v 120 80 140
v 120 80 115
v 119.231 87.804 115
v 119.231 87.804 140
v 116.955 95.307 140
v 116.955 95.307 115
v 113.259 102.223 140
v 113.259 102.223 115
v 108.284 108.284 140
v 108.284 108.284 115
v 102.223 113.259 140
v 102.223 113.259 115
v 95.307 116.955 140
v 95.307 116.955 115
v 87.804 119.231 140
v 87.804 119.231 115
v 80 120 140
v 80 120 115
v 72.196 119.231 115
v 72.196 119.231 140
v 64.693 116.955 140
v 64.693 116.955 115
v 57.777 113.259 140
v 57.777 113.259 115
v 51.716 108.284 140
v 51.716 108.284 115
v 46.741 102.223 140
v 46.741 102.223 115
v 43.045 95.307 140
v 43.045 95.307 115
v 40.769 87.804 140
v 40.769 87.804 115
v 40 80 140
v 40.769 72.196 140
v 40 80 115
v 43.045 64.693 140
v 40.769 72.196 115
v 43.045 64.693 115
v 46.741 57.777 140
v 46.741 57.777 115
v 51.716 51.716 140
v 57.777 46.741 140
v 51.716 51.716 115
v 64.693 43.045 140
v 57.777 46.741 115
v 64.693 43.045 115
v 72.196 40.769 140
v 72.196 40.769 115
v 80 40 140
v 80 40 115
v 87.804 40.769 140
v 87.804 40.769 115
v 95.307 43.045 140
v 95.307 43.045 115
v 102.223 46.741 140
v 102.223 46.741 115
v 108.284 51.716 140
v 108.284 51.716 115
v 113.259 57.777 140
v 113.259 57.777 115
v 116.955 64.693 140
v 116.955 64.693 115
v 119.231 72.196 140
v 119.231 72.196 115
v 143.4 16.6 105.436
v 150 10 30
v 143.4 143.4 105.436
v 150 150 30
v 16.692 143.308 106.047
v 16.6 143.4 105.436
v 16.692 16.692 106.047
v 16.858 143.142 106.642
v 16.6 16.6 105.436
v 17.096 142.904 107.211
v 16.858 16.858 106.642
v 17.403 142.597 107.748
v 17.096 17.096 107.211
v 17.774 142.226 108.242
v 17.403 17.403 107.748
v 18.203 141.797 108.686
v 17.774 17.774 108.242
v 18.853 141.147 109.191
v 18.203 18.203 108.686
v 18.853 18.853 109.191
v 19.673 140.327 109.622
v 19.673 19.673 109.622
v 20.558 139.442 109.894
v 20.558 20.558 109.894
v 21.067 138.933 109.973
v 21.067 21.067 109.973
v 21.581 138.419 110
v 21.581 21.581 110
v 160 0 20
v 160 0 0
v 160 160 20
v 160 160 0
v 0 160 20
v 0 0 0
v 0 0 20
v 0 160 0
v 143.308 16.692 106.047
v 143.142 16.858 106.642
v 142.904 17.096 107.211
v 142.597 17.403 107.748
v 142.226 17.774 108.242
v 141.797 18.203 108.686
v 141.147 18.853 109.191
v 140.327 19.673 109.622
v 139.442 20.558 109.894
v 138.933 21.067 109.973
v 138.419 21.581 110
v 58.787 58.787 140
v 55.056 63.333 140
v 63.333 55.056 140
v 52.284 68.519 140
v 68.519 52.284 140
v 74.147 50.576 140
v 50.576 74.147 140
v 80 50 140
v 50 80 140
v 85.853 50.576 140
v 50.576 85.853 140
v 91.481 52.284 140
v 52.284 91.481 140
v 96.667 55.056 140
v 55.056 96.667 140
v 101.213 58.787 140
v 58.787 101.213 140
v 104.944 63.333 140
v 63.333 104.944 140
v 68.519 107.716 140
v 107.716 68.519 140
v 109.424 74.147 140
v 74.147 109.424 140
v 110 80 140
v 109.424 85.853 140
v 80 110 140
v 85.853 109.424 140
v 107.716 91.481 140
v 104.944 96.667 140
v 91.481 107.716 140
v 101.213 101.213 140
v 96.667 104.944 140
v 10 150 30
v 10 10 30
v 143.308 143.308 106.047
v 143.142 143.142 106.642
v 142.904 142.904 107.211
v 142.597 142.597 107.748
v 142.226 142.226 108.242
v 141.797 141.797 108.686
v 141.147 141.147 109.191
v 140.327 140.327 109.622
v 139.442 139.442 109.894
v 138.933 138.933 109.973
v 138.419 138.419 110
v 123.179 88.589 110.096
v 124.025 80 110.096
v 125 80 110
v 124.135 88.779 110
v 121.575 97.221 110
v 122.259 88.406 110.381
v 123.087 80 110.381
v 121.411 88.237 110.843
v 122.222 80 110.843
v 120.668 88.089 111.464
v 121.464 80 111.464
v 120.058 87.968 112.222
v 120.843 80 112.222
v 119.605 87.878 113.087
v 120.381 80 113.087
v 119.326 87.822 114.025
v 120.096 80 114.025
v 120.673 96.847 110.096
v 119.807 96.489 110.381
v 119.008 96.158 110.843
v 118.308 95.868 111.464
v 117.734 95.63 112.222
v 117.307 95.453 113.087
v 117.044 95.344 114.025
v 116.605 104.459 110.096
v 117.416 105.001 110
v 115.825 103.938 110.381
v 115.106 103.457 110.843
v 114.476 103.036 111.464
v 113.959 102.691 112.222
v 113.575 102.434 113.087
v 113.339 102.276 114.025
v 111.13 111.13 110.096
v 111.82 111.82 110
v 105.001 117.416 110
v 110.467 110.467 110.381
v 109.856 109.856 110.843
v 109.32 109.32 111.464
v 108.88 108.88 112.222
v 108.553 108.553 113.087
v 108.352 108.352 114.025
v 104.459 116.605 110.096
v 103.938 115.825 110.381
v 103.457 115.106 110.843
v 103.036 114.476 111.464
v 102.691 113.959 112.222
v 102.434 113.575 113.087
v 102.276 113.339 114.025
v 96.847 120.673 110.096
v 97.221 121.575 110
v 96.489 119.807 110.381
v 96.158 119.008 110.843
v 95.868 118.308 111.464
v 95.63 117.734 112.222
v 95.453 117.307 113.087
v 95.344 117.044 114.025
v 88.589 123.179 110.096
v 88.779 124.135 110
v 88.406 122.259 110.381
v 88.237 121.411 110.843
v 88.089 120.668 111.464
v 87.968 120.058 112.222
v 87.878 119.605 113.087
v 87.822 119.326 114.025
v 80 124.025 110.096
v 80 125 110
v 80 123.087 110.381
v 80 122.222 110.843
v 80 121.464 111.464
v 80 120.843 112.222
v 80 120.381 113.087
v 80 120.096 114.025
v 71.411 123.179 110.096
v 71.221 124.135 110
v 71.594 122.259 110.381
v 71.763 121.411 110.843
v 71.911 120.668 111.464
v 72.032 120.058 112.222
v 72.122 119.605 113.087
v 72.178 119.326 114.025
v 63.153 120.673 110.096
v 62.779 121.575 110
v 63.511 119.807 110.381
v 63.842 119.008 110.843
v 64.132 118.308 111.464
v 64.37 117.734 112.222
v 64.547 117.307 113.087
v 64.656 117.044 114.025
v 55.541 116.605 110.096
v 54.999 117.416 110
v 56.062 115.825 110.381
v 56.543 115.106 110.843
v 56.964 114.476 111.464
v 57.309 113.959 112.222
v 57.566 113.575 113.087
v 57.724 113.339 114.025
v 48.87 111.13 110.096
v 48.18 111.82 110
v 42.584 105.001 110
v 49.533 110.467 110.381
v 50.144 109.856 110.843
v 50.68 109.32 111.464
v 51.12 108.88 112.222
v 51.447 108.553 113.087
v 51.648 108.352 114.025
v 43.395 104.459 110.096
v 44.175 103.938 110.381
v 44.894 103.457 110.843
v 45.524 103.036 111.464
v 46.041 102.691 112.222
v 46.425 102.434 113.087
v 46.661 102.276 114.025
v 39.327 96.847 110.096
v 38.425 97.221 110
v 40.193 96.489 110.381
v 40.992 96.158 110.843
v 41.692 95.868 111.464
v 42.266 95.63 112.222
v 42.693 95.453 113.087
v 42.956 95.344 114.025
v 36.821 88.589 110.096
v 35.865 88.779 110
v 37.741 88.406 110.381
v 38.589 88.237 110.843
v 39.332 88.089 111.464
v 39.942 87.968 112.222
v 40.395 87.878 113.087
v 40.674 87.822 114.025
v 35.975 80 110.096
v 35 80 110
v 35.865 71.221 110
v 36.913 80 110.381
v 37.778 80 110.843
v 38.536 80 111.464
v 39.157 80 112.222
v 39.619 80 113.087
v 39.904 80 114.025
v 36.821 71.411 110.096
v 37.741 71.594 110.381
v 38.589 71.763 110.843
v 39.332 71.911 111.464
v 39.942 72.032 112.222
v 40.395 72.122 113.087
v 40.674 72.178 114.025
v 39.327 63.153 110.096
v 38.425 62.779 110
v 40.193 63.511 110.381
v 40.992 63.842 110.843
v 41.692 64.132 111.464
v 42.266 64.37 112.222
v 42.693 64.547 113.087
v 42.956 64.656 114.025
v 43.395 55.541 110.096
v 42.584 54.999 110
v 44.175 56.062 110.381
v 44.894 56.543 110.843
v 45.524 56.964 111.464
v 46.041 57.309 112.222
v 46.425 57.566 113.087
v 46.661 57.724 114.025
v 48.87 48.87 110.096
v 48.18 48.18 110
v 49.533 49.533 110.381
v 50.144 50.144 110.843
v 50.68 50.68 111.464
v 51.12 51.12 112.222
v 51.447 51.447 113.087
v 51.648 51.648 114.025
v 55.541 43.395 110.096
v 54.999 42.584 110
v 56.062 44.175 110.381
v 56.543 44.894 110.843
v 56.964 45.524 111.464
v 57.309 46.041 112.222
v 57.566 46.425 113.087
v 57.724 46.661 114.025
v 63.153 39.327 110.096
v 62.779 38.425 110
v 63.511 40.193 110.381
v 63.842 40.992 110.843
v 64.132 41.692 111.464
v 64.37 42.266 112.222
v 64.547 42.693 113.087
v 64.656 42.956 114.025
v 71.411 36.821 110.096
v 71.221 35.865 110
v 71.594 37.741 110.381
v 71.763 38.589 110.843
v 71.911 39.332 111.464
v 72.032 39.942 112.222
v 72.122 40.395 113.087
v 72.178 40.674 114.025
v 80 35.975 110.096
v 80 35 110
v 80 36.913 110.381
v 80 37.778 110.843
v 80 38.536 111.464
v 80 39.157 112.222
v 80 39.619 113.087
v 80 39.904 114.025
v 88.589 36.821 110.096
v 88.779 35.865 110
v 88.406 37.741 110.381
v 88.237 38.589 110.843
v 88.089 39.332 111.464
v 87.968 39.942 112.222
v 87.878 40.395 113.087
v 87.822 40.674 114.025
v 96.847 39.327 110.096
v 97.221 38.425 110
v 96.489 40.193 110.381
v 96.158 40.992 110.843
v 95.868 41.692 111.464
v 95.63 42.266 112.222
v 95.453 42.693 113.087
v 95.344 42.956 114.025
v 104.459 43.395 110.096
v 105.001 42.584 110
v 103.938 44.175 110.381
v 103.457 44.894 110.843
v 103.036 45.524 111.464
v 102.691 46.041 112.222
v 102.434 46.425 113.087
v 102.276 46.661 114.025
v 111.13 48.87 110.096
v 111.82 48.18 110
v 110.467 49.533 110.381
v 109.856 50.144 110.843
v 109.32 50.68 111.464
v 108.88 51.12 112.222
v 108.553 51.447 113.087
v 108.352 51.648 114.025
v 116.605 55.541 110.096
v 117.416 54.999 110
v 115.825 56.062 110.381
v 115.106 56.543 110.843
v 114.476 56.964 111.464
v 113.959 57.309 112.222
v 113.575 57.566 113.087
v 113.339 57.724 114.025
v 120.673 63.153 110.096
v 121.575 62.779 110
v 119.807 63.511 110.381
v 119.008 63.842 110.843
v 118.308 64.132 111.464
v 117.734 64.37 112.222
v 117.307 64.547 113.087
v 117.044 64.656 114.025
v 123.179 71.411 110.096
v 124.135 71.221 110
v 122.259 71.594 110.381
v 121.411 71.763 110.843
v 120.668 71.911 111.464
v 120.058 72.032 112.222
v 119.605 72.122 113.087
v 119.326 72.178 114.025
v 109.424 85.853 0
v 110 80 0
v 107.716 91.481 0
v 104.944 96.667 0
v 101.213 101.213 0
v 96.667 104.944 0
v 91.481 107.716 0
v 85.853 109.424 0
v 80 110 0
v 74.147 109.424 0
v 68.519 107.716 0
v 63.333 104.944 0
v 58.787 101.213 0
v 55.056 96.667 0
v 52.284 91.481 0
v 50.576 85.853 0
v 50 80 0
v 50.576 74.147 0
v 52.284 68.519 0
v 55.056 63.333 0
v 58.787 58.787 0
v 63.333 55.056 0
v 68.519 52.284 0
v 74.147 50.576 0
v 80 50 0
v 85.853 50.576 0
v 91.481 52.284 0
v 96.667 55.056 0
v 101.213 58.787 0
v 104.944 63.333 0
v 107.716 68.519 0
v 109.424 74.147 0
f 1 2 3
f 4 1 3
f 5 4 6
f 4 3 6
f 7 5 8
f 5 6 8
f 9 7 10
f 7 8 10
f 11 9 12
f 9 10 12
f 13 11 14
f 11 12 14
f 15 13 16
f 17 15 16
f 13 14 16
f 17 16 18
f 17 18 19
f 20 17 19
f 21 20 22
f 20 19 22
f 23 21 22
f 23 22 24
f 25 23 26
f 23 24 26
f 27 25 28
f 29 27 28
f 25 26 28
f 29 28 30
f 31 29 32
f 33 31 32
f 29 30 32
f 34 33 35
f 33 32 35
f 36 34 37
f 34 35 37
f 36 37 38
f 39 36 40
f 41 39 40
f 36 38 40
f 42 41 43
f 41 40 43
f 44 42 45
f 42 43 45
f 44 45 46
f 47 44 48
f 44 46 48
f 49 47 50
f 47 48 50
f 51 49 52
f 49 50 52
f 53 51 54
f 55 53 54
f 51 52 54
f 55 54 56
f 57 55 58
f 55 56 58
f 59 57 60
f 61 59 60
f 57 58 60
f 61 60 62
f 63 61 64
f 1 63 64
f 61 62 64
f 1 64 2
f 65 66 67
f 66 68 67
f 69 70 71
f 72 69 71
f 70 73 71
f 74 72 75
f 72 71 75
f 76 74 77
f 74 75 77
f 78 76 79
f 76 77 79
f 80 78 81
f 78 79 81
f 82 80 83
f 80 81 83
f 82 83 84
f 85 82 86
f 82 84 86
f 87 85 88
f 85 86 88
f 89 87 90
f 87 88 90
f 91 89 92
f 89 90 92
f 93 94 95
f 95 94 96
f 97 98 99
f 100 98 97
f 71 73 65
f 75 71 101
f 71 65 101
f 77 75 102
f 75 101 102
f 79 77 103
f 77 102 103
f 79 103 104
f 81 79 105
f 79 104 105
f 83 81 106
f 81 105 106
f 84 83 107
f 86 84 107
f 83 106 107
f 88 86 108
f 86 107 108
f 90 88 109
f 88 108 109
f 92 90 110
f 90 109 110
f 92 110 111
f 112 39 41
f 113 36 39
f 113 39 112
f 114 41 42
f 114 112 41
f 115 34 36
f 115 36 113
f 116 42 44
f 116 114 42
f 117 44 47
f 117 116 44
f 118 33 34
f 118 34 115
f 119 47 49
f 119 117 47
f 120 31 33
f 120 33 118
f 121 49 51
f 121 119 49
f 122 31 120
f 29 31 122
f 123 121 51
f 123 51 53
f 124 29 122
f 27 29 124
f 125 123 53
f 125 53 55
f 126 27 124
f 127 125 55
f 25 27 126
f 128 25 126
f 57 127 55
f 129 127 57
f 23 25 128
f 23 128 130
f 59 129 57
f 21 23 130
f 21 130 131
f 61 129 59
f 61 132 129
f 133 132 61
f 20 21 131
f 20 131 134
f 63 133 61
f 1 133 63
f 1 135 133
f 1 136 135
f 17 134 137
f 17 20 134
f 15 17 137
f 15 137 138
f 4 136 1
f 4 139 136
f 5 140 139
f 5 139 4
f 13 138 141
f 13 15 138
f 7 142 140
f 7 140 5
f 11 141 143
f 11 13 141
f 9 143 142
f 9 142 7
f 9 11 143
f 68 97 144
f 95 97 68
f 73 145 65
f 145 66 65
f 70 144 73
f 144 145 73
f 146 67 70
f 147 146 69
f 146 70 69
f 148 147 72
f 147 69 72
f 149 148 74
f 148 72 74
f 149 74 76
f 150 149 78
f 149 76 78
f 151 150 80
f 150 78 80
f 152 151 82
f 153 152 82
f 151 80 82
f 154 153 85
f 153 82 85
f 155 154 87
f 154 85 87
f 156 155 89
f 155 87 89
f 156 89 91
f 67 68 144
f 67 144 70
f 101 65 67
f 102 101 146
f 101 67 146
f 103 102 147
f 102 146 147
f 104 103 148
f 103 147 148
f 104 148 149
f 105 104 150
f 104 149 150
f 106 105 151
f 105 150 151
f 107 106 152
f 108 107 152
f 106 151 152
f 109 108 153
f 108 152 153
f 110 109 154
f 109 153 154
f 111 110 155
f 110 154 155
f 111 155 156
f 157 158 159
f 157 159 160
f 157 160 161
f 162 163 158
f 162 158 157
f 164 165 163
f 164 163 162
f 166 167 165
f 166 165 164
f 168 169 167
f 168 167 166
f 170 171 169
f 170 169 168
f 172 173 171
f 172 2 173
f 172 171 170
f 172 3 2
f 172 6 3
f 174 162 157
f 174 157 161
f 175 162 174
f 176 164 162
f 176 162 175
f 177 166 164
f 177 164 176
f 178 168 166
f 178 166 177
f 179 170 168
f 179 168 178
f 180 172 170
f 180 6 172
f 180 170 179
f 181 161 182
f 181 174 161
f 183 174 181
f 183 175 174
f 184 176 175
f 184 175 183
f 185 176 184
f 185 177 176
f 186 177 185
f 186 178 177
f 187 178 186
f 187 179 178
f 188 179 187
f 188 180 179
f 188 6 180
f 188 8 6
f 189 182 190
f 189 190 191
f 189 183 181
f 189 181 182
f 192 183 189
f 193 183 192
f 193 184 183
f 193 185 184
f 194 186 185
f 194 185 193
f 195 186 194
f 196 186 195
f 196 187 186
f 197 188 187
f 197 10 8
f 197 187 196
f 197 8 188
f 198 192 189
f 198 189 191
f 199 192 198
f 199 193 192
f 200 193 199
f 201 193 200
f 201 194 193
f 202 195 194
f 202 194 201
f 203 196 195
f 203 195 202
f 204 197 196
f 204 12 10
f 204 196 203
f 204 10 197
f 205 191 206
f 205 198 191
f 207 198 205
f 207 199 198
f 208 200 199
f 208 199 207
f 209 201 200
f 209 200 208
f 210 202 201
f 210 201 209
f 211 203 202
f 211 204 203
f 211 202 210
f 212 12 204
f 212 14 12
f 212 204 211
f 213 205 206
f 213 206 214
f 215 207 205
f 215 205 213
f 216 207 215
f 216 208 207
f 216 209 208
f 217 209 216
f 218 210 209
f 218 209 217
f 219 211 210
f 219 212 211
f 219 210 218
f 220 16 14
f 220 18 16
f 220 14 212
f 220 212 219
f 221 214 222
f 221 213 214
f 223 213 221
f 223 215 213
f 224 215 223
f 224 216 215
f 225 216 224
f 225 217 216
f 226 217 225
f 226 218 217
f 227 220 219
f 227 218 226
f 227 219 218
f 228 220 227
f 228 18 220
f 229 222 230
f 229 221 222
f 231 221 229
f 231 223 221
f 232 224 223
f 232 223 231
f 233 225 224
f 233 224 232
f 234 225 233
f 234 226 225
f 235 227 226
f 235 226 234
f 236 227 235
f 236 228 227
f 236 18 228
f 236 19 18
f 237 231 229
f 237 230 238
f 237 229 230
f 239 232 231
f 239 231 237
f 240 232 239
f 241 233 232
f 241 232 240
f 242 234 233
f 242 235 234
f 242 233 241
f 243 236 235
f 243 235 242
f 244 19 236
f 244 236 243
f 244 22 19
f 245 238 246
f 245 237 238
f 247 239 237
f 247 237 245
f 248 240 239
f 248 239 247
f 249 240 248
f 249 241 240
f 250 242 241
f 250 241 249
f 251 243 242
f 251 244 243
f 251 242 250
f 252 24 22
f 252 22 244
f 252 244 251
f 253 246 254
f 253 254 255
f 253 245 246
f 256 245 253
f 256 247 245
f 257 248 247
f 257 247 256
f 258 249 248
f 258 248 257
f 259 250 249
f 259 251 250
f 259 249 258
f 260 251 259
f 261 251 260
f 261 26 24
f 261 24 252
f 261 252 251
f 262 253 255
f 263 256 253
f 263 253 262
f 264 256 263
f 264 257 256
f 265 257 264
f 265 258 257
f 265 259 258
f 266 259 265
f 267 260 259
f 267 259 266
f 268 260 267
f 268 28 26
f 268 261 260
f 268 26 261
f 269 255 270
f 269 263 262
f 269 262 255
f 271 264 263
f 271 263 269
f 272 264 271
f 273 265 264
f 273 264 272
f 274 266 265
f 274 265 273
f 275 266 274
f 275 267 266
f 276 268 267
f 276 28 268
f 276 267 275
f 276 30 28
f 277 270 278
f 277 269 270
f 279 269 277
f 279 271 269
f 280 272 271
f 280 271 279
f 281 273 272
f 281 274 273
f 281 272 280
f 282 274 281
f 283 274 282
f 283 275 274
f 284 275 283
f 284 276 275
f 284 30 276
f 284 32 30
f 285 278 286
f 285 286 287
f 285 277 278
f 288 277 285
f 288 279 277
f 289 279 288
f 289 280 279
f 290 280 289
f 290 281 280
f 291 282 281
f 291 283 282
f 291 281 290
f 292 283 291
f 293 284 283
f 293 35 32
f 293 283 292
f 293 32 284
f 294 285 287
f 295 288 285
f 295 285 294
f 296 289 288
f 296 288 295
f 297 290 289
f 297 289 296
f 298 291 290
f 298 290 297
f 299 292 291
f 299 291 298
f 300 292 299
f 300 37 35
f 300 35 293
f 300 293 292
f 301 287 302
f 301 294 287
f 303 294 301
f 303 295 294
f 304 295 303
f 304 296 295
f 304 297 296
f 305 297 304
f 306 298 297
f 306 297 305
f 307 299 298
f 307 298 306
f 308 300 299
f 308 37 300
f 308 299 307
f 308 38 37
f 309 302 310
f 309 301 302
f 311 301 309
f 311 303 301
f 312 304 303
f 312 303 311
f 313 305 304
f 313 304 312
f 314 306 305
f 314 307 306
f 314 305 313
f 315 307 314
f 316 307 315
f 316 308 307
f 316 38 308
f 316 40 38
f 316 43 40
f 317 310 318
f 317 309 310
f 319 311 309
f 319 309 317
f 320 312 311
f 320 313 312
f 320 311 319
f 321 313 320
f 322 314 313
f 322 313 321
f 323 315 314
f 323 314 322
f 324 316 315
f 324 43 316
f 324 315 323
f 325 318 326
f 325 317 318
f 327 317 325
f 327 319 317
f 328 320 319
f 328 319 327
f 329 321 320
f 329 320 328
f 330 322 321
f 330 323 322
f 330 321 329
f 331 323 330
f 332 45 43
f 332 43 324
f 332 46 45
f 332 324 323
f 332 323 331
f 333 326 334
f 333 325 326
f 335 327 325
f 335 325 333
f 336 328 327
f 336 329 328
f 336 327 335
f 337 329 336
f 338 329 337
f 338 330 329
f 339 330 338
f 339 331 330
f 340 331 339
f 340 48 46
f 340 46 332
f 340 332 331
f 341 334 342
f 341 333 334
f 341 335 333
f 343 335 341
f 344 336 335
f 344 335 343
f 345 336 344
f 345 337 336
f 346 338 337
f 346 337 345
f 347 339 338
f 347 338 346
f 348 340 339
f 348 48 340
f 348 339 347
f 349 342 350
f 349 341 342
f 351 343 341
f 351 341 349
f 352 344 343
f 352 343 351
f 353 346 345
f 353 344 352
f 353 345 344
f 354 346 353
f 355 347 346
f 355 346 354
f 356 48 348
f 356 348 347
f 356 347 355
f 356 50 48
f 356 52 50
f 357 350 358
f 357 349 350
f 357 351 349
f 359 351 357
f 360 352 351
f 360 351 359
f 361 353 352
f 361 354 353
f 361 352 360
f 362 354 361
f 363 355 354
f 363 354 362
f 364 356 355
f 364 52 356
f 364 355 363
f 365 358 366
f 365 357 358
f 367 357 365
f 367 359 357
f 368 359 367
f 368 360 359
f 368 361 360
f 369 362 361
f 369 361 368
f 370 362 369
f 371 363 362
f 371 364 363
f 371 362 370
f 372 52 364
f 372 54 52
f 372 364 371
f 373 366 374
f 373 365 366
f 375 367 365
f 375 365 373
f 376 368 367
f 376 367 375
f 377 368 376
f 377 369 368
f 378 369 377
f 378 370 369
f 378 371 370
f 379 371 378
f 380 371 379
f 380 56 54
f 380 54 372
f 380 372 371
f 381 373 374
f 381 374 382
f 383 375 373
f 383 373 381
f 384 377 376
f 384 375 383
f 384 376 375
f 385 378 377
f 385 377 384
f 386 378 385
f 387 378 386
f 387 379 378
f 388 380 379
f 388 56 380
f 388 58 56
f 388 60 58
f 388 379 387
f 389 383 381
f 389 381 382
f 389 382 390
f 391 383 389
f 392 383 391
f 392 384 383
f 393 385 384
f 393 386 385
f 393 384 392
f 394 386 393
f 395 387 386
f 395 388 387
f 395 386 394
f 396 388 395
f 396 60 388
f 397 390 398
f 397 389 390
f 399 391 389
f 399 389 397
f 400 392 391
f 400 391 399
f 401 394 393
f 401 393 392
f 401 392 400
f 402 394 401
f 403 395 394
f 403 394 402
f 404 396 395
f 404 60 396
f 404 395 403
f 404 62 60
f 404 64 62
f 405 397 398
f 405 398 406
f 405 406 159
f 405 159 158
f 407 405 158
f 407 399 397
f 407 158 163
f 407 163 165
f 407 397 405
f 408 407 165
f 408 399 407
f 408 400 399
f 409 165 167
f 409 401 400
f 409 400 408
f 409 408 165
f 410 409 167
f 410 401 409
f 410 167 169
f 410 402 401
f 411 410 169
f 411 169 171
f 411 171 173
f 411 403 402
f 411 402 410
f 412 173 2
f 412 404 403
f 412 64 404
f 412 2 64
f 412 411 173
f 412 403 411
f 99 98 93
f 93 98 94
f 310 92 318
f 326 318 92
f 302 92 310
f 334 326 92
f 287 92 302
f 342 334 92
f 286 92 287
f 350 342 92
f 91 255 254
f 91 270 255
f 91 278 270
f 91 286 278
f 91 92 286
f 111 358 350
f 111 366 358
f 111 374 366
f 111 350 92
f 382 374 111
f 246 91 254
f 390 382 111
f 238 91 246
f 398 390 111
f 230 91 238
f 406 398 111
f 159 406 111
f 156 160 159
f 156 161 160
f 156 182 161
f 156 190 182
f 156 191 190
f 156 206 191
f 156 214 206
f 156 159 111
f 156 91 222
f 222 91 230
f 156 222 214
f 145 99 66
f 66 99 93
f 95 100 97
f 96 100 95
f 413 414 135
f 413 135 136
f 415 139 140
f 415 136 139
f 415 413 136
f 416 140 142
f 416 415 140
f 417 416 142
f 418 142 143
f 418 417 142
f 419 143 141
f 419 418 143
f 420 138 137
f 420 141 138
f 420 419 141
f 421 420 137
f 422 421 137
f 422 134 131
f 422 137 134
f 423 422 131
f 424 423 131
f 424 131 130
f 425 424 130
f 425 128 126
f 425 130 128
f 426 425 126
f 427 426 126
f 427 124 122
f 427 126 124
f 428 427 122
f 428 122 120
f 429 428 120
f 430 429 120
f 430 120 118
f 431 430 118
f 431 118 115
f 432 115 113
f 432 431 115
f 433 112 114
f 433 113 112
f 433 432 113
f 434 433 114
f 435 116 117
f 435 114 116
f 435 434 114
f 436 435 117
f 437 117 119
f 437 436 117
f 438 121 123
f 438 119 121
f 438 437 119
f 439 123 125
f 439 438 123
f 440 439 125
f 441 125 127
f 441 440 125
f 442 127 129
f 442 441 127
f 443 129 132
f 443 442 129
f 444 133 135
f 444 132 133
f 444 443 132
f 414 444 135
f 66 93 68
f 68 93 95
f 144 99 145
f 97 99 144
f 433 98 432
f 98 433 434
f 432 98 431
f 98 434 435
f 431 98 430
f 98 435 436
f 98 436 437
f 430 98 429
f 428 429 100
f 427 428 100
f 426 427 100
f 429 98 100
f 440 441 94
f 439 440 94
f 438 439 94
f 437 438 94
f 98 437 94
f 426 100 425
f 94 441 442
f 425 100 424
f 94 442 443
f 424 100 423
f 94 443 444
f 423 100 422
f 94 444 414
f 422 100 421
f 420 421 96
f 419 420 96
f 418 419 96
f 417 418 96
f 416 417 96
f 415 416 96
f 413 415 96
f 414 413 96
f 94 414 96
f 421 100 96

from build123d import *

# Parameters (mm, degrees)
SKETCH1_W               = 160
SKETCH1_H               = 160
BOSS_EXTRUDE1_DEPTH     = 30
SKETCH2_W               = 140
SKETCH2_H               = 140
BOSS_EXTRUDE2_DEPTH     = 80
BOSS_EXTRUDE2_TAPER     = 5
SKETCH3_R               = 40
BOSS_EXTRUDE3_DEPTH     = 30
CUT_EXTRUDE1_DEPTH      = 267.082693913
CUT_EXTRUDE1_DEPTH_BACK = 267.082693913
SKETCH4_R               = 30
FILLET1_R               = 5
CHAMFER1_SIZE           = 10


with BuildPart() as part:
    # Sketch1 → Boss-Extrude1 (new body)
    with BuildSketch(Plane.XY):
        with Locations((80, 80)):
            Rectangle(SKETCH1_W, SKETCH1_H)
    extrude(amount=BOSS_EXTRUDE1_DEPTH)

    # Sketch2 → Boss-Extrude2 (add)
    with BuildSketch(Plane.XY.offset(30)):
        with Locations((80, 80)):
            Rectangle(SKETCH2_W, SKETCH2_H)
    extrude(amount=BOSS_EXTRUDE2_DEPTH, taper=BOSS_EXTRUDE2_TAPER)

    # Sketch3 → Boss-Extrude3 (add)
    with BuildSketch(Plane.XY.offset(110)):
        with Locations((80, 80)):
            Circle(SKETCH3_R)
    extrude(amount=BOSS_EXTRUDE3_DEPTH)

    # Sketch4 → Cut-Extrude1 (cut, two sides: drawn at the far end of the back side and taken through both)
    with BuildSketch(Plane.XY.offset(140).offset(-CUT_EXTRUDE1_DEPTH_BACK)):
        with Locations((80, 80)):
            Circle(SKETCH4_R)
    extrude(amount=CUT_EXTRUDE1_DEPTH + CUT_EXTRUDE1_DEPTH_BACK, mode=Mode.SUBTRACT)

    # Fillet1
    fillet1_edges = [part.edges().sort_by_distance(p)[0] for p in [
        (16.999093082, 80, 110),
        (80, 16.999093082, 110),
        (143.000906918, 80, 110),
        (80, 143.000906918, 110),
        (40, 80, 110),
    ]]
    fillet(fillet1_edges, radius=FILLET1_R)

    # Chamfer1
    chamfer1_edges = [part.edges().sort_by_distance(p)[0] for p in [
        (160, 80, 30),
        (80, 160, 30),
        (0, 80, 30),
        (80, 0, 30),
    ]]
    chamfer(chamfer1_edges, length=CHAMFER1_SIZE - 0.0001)  # a hair under: the kernel refuses the full size


solid = part.part
